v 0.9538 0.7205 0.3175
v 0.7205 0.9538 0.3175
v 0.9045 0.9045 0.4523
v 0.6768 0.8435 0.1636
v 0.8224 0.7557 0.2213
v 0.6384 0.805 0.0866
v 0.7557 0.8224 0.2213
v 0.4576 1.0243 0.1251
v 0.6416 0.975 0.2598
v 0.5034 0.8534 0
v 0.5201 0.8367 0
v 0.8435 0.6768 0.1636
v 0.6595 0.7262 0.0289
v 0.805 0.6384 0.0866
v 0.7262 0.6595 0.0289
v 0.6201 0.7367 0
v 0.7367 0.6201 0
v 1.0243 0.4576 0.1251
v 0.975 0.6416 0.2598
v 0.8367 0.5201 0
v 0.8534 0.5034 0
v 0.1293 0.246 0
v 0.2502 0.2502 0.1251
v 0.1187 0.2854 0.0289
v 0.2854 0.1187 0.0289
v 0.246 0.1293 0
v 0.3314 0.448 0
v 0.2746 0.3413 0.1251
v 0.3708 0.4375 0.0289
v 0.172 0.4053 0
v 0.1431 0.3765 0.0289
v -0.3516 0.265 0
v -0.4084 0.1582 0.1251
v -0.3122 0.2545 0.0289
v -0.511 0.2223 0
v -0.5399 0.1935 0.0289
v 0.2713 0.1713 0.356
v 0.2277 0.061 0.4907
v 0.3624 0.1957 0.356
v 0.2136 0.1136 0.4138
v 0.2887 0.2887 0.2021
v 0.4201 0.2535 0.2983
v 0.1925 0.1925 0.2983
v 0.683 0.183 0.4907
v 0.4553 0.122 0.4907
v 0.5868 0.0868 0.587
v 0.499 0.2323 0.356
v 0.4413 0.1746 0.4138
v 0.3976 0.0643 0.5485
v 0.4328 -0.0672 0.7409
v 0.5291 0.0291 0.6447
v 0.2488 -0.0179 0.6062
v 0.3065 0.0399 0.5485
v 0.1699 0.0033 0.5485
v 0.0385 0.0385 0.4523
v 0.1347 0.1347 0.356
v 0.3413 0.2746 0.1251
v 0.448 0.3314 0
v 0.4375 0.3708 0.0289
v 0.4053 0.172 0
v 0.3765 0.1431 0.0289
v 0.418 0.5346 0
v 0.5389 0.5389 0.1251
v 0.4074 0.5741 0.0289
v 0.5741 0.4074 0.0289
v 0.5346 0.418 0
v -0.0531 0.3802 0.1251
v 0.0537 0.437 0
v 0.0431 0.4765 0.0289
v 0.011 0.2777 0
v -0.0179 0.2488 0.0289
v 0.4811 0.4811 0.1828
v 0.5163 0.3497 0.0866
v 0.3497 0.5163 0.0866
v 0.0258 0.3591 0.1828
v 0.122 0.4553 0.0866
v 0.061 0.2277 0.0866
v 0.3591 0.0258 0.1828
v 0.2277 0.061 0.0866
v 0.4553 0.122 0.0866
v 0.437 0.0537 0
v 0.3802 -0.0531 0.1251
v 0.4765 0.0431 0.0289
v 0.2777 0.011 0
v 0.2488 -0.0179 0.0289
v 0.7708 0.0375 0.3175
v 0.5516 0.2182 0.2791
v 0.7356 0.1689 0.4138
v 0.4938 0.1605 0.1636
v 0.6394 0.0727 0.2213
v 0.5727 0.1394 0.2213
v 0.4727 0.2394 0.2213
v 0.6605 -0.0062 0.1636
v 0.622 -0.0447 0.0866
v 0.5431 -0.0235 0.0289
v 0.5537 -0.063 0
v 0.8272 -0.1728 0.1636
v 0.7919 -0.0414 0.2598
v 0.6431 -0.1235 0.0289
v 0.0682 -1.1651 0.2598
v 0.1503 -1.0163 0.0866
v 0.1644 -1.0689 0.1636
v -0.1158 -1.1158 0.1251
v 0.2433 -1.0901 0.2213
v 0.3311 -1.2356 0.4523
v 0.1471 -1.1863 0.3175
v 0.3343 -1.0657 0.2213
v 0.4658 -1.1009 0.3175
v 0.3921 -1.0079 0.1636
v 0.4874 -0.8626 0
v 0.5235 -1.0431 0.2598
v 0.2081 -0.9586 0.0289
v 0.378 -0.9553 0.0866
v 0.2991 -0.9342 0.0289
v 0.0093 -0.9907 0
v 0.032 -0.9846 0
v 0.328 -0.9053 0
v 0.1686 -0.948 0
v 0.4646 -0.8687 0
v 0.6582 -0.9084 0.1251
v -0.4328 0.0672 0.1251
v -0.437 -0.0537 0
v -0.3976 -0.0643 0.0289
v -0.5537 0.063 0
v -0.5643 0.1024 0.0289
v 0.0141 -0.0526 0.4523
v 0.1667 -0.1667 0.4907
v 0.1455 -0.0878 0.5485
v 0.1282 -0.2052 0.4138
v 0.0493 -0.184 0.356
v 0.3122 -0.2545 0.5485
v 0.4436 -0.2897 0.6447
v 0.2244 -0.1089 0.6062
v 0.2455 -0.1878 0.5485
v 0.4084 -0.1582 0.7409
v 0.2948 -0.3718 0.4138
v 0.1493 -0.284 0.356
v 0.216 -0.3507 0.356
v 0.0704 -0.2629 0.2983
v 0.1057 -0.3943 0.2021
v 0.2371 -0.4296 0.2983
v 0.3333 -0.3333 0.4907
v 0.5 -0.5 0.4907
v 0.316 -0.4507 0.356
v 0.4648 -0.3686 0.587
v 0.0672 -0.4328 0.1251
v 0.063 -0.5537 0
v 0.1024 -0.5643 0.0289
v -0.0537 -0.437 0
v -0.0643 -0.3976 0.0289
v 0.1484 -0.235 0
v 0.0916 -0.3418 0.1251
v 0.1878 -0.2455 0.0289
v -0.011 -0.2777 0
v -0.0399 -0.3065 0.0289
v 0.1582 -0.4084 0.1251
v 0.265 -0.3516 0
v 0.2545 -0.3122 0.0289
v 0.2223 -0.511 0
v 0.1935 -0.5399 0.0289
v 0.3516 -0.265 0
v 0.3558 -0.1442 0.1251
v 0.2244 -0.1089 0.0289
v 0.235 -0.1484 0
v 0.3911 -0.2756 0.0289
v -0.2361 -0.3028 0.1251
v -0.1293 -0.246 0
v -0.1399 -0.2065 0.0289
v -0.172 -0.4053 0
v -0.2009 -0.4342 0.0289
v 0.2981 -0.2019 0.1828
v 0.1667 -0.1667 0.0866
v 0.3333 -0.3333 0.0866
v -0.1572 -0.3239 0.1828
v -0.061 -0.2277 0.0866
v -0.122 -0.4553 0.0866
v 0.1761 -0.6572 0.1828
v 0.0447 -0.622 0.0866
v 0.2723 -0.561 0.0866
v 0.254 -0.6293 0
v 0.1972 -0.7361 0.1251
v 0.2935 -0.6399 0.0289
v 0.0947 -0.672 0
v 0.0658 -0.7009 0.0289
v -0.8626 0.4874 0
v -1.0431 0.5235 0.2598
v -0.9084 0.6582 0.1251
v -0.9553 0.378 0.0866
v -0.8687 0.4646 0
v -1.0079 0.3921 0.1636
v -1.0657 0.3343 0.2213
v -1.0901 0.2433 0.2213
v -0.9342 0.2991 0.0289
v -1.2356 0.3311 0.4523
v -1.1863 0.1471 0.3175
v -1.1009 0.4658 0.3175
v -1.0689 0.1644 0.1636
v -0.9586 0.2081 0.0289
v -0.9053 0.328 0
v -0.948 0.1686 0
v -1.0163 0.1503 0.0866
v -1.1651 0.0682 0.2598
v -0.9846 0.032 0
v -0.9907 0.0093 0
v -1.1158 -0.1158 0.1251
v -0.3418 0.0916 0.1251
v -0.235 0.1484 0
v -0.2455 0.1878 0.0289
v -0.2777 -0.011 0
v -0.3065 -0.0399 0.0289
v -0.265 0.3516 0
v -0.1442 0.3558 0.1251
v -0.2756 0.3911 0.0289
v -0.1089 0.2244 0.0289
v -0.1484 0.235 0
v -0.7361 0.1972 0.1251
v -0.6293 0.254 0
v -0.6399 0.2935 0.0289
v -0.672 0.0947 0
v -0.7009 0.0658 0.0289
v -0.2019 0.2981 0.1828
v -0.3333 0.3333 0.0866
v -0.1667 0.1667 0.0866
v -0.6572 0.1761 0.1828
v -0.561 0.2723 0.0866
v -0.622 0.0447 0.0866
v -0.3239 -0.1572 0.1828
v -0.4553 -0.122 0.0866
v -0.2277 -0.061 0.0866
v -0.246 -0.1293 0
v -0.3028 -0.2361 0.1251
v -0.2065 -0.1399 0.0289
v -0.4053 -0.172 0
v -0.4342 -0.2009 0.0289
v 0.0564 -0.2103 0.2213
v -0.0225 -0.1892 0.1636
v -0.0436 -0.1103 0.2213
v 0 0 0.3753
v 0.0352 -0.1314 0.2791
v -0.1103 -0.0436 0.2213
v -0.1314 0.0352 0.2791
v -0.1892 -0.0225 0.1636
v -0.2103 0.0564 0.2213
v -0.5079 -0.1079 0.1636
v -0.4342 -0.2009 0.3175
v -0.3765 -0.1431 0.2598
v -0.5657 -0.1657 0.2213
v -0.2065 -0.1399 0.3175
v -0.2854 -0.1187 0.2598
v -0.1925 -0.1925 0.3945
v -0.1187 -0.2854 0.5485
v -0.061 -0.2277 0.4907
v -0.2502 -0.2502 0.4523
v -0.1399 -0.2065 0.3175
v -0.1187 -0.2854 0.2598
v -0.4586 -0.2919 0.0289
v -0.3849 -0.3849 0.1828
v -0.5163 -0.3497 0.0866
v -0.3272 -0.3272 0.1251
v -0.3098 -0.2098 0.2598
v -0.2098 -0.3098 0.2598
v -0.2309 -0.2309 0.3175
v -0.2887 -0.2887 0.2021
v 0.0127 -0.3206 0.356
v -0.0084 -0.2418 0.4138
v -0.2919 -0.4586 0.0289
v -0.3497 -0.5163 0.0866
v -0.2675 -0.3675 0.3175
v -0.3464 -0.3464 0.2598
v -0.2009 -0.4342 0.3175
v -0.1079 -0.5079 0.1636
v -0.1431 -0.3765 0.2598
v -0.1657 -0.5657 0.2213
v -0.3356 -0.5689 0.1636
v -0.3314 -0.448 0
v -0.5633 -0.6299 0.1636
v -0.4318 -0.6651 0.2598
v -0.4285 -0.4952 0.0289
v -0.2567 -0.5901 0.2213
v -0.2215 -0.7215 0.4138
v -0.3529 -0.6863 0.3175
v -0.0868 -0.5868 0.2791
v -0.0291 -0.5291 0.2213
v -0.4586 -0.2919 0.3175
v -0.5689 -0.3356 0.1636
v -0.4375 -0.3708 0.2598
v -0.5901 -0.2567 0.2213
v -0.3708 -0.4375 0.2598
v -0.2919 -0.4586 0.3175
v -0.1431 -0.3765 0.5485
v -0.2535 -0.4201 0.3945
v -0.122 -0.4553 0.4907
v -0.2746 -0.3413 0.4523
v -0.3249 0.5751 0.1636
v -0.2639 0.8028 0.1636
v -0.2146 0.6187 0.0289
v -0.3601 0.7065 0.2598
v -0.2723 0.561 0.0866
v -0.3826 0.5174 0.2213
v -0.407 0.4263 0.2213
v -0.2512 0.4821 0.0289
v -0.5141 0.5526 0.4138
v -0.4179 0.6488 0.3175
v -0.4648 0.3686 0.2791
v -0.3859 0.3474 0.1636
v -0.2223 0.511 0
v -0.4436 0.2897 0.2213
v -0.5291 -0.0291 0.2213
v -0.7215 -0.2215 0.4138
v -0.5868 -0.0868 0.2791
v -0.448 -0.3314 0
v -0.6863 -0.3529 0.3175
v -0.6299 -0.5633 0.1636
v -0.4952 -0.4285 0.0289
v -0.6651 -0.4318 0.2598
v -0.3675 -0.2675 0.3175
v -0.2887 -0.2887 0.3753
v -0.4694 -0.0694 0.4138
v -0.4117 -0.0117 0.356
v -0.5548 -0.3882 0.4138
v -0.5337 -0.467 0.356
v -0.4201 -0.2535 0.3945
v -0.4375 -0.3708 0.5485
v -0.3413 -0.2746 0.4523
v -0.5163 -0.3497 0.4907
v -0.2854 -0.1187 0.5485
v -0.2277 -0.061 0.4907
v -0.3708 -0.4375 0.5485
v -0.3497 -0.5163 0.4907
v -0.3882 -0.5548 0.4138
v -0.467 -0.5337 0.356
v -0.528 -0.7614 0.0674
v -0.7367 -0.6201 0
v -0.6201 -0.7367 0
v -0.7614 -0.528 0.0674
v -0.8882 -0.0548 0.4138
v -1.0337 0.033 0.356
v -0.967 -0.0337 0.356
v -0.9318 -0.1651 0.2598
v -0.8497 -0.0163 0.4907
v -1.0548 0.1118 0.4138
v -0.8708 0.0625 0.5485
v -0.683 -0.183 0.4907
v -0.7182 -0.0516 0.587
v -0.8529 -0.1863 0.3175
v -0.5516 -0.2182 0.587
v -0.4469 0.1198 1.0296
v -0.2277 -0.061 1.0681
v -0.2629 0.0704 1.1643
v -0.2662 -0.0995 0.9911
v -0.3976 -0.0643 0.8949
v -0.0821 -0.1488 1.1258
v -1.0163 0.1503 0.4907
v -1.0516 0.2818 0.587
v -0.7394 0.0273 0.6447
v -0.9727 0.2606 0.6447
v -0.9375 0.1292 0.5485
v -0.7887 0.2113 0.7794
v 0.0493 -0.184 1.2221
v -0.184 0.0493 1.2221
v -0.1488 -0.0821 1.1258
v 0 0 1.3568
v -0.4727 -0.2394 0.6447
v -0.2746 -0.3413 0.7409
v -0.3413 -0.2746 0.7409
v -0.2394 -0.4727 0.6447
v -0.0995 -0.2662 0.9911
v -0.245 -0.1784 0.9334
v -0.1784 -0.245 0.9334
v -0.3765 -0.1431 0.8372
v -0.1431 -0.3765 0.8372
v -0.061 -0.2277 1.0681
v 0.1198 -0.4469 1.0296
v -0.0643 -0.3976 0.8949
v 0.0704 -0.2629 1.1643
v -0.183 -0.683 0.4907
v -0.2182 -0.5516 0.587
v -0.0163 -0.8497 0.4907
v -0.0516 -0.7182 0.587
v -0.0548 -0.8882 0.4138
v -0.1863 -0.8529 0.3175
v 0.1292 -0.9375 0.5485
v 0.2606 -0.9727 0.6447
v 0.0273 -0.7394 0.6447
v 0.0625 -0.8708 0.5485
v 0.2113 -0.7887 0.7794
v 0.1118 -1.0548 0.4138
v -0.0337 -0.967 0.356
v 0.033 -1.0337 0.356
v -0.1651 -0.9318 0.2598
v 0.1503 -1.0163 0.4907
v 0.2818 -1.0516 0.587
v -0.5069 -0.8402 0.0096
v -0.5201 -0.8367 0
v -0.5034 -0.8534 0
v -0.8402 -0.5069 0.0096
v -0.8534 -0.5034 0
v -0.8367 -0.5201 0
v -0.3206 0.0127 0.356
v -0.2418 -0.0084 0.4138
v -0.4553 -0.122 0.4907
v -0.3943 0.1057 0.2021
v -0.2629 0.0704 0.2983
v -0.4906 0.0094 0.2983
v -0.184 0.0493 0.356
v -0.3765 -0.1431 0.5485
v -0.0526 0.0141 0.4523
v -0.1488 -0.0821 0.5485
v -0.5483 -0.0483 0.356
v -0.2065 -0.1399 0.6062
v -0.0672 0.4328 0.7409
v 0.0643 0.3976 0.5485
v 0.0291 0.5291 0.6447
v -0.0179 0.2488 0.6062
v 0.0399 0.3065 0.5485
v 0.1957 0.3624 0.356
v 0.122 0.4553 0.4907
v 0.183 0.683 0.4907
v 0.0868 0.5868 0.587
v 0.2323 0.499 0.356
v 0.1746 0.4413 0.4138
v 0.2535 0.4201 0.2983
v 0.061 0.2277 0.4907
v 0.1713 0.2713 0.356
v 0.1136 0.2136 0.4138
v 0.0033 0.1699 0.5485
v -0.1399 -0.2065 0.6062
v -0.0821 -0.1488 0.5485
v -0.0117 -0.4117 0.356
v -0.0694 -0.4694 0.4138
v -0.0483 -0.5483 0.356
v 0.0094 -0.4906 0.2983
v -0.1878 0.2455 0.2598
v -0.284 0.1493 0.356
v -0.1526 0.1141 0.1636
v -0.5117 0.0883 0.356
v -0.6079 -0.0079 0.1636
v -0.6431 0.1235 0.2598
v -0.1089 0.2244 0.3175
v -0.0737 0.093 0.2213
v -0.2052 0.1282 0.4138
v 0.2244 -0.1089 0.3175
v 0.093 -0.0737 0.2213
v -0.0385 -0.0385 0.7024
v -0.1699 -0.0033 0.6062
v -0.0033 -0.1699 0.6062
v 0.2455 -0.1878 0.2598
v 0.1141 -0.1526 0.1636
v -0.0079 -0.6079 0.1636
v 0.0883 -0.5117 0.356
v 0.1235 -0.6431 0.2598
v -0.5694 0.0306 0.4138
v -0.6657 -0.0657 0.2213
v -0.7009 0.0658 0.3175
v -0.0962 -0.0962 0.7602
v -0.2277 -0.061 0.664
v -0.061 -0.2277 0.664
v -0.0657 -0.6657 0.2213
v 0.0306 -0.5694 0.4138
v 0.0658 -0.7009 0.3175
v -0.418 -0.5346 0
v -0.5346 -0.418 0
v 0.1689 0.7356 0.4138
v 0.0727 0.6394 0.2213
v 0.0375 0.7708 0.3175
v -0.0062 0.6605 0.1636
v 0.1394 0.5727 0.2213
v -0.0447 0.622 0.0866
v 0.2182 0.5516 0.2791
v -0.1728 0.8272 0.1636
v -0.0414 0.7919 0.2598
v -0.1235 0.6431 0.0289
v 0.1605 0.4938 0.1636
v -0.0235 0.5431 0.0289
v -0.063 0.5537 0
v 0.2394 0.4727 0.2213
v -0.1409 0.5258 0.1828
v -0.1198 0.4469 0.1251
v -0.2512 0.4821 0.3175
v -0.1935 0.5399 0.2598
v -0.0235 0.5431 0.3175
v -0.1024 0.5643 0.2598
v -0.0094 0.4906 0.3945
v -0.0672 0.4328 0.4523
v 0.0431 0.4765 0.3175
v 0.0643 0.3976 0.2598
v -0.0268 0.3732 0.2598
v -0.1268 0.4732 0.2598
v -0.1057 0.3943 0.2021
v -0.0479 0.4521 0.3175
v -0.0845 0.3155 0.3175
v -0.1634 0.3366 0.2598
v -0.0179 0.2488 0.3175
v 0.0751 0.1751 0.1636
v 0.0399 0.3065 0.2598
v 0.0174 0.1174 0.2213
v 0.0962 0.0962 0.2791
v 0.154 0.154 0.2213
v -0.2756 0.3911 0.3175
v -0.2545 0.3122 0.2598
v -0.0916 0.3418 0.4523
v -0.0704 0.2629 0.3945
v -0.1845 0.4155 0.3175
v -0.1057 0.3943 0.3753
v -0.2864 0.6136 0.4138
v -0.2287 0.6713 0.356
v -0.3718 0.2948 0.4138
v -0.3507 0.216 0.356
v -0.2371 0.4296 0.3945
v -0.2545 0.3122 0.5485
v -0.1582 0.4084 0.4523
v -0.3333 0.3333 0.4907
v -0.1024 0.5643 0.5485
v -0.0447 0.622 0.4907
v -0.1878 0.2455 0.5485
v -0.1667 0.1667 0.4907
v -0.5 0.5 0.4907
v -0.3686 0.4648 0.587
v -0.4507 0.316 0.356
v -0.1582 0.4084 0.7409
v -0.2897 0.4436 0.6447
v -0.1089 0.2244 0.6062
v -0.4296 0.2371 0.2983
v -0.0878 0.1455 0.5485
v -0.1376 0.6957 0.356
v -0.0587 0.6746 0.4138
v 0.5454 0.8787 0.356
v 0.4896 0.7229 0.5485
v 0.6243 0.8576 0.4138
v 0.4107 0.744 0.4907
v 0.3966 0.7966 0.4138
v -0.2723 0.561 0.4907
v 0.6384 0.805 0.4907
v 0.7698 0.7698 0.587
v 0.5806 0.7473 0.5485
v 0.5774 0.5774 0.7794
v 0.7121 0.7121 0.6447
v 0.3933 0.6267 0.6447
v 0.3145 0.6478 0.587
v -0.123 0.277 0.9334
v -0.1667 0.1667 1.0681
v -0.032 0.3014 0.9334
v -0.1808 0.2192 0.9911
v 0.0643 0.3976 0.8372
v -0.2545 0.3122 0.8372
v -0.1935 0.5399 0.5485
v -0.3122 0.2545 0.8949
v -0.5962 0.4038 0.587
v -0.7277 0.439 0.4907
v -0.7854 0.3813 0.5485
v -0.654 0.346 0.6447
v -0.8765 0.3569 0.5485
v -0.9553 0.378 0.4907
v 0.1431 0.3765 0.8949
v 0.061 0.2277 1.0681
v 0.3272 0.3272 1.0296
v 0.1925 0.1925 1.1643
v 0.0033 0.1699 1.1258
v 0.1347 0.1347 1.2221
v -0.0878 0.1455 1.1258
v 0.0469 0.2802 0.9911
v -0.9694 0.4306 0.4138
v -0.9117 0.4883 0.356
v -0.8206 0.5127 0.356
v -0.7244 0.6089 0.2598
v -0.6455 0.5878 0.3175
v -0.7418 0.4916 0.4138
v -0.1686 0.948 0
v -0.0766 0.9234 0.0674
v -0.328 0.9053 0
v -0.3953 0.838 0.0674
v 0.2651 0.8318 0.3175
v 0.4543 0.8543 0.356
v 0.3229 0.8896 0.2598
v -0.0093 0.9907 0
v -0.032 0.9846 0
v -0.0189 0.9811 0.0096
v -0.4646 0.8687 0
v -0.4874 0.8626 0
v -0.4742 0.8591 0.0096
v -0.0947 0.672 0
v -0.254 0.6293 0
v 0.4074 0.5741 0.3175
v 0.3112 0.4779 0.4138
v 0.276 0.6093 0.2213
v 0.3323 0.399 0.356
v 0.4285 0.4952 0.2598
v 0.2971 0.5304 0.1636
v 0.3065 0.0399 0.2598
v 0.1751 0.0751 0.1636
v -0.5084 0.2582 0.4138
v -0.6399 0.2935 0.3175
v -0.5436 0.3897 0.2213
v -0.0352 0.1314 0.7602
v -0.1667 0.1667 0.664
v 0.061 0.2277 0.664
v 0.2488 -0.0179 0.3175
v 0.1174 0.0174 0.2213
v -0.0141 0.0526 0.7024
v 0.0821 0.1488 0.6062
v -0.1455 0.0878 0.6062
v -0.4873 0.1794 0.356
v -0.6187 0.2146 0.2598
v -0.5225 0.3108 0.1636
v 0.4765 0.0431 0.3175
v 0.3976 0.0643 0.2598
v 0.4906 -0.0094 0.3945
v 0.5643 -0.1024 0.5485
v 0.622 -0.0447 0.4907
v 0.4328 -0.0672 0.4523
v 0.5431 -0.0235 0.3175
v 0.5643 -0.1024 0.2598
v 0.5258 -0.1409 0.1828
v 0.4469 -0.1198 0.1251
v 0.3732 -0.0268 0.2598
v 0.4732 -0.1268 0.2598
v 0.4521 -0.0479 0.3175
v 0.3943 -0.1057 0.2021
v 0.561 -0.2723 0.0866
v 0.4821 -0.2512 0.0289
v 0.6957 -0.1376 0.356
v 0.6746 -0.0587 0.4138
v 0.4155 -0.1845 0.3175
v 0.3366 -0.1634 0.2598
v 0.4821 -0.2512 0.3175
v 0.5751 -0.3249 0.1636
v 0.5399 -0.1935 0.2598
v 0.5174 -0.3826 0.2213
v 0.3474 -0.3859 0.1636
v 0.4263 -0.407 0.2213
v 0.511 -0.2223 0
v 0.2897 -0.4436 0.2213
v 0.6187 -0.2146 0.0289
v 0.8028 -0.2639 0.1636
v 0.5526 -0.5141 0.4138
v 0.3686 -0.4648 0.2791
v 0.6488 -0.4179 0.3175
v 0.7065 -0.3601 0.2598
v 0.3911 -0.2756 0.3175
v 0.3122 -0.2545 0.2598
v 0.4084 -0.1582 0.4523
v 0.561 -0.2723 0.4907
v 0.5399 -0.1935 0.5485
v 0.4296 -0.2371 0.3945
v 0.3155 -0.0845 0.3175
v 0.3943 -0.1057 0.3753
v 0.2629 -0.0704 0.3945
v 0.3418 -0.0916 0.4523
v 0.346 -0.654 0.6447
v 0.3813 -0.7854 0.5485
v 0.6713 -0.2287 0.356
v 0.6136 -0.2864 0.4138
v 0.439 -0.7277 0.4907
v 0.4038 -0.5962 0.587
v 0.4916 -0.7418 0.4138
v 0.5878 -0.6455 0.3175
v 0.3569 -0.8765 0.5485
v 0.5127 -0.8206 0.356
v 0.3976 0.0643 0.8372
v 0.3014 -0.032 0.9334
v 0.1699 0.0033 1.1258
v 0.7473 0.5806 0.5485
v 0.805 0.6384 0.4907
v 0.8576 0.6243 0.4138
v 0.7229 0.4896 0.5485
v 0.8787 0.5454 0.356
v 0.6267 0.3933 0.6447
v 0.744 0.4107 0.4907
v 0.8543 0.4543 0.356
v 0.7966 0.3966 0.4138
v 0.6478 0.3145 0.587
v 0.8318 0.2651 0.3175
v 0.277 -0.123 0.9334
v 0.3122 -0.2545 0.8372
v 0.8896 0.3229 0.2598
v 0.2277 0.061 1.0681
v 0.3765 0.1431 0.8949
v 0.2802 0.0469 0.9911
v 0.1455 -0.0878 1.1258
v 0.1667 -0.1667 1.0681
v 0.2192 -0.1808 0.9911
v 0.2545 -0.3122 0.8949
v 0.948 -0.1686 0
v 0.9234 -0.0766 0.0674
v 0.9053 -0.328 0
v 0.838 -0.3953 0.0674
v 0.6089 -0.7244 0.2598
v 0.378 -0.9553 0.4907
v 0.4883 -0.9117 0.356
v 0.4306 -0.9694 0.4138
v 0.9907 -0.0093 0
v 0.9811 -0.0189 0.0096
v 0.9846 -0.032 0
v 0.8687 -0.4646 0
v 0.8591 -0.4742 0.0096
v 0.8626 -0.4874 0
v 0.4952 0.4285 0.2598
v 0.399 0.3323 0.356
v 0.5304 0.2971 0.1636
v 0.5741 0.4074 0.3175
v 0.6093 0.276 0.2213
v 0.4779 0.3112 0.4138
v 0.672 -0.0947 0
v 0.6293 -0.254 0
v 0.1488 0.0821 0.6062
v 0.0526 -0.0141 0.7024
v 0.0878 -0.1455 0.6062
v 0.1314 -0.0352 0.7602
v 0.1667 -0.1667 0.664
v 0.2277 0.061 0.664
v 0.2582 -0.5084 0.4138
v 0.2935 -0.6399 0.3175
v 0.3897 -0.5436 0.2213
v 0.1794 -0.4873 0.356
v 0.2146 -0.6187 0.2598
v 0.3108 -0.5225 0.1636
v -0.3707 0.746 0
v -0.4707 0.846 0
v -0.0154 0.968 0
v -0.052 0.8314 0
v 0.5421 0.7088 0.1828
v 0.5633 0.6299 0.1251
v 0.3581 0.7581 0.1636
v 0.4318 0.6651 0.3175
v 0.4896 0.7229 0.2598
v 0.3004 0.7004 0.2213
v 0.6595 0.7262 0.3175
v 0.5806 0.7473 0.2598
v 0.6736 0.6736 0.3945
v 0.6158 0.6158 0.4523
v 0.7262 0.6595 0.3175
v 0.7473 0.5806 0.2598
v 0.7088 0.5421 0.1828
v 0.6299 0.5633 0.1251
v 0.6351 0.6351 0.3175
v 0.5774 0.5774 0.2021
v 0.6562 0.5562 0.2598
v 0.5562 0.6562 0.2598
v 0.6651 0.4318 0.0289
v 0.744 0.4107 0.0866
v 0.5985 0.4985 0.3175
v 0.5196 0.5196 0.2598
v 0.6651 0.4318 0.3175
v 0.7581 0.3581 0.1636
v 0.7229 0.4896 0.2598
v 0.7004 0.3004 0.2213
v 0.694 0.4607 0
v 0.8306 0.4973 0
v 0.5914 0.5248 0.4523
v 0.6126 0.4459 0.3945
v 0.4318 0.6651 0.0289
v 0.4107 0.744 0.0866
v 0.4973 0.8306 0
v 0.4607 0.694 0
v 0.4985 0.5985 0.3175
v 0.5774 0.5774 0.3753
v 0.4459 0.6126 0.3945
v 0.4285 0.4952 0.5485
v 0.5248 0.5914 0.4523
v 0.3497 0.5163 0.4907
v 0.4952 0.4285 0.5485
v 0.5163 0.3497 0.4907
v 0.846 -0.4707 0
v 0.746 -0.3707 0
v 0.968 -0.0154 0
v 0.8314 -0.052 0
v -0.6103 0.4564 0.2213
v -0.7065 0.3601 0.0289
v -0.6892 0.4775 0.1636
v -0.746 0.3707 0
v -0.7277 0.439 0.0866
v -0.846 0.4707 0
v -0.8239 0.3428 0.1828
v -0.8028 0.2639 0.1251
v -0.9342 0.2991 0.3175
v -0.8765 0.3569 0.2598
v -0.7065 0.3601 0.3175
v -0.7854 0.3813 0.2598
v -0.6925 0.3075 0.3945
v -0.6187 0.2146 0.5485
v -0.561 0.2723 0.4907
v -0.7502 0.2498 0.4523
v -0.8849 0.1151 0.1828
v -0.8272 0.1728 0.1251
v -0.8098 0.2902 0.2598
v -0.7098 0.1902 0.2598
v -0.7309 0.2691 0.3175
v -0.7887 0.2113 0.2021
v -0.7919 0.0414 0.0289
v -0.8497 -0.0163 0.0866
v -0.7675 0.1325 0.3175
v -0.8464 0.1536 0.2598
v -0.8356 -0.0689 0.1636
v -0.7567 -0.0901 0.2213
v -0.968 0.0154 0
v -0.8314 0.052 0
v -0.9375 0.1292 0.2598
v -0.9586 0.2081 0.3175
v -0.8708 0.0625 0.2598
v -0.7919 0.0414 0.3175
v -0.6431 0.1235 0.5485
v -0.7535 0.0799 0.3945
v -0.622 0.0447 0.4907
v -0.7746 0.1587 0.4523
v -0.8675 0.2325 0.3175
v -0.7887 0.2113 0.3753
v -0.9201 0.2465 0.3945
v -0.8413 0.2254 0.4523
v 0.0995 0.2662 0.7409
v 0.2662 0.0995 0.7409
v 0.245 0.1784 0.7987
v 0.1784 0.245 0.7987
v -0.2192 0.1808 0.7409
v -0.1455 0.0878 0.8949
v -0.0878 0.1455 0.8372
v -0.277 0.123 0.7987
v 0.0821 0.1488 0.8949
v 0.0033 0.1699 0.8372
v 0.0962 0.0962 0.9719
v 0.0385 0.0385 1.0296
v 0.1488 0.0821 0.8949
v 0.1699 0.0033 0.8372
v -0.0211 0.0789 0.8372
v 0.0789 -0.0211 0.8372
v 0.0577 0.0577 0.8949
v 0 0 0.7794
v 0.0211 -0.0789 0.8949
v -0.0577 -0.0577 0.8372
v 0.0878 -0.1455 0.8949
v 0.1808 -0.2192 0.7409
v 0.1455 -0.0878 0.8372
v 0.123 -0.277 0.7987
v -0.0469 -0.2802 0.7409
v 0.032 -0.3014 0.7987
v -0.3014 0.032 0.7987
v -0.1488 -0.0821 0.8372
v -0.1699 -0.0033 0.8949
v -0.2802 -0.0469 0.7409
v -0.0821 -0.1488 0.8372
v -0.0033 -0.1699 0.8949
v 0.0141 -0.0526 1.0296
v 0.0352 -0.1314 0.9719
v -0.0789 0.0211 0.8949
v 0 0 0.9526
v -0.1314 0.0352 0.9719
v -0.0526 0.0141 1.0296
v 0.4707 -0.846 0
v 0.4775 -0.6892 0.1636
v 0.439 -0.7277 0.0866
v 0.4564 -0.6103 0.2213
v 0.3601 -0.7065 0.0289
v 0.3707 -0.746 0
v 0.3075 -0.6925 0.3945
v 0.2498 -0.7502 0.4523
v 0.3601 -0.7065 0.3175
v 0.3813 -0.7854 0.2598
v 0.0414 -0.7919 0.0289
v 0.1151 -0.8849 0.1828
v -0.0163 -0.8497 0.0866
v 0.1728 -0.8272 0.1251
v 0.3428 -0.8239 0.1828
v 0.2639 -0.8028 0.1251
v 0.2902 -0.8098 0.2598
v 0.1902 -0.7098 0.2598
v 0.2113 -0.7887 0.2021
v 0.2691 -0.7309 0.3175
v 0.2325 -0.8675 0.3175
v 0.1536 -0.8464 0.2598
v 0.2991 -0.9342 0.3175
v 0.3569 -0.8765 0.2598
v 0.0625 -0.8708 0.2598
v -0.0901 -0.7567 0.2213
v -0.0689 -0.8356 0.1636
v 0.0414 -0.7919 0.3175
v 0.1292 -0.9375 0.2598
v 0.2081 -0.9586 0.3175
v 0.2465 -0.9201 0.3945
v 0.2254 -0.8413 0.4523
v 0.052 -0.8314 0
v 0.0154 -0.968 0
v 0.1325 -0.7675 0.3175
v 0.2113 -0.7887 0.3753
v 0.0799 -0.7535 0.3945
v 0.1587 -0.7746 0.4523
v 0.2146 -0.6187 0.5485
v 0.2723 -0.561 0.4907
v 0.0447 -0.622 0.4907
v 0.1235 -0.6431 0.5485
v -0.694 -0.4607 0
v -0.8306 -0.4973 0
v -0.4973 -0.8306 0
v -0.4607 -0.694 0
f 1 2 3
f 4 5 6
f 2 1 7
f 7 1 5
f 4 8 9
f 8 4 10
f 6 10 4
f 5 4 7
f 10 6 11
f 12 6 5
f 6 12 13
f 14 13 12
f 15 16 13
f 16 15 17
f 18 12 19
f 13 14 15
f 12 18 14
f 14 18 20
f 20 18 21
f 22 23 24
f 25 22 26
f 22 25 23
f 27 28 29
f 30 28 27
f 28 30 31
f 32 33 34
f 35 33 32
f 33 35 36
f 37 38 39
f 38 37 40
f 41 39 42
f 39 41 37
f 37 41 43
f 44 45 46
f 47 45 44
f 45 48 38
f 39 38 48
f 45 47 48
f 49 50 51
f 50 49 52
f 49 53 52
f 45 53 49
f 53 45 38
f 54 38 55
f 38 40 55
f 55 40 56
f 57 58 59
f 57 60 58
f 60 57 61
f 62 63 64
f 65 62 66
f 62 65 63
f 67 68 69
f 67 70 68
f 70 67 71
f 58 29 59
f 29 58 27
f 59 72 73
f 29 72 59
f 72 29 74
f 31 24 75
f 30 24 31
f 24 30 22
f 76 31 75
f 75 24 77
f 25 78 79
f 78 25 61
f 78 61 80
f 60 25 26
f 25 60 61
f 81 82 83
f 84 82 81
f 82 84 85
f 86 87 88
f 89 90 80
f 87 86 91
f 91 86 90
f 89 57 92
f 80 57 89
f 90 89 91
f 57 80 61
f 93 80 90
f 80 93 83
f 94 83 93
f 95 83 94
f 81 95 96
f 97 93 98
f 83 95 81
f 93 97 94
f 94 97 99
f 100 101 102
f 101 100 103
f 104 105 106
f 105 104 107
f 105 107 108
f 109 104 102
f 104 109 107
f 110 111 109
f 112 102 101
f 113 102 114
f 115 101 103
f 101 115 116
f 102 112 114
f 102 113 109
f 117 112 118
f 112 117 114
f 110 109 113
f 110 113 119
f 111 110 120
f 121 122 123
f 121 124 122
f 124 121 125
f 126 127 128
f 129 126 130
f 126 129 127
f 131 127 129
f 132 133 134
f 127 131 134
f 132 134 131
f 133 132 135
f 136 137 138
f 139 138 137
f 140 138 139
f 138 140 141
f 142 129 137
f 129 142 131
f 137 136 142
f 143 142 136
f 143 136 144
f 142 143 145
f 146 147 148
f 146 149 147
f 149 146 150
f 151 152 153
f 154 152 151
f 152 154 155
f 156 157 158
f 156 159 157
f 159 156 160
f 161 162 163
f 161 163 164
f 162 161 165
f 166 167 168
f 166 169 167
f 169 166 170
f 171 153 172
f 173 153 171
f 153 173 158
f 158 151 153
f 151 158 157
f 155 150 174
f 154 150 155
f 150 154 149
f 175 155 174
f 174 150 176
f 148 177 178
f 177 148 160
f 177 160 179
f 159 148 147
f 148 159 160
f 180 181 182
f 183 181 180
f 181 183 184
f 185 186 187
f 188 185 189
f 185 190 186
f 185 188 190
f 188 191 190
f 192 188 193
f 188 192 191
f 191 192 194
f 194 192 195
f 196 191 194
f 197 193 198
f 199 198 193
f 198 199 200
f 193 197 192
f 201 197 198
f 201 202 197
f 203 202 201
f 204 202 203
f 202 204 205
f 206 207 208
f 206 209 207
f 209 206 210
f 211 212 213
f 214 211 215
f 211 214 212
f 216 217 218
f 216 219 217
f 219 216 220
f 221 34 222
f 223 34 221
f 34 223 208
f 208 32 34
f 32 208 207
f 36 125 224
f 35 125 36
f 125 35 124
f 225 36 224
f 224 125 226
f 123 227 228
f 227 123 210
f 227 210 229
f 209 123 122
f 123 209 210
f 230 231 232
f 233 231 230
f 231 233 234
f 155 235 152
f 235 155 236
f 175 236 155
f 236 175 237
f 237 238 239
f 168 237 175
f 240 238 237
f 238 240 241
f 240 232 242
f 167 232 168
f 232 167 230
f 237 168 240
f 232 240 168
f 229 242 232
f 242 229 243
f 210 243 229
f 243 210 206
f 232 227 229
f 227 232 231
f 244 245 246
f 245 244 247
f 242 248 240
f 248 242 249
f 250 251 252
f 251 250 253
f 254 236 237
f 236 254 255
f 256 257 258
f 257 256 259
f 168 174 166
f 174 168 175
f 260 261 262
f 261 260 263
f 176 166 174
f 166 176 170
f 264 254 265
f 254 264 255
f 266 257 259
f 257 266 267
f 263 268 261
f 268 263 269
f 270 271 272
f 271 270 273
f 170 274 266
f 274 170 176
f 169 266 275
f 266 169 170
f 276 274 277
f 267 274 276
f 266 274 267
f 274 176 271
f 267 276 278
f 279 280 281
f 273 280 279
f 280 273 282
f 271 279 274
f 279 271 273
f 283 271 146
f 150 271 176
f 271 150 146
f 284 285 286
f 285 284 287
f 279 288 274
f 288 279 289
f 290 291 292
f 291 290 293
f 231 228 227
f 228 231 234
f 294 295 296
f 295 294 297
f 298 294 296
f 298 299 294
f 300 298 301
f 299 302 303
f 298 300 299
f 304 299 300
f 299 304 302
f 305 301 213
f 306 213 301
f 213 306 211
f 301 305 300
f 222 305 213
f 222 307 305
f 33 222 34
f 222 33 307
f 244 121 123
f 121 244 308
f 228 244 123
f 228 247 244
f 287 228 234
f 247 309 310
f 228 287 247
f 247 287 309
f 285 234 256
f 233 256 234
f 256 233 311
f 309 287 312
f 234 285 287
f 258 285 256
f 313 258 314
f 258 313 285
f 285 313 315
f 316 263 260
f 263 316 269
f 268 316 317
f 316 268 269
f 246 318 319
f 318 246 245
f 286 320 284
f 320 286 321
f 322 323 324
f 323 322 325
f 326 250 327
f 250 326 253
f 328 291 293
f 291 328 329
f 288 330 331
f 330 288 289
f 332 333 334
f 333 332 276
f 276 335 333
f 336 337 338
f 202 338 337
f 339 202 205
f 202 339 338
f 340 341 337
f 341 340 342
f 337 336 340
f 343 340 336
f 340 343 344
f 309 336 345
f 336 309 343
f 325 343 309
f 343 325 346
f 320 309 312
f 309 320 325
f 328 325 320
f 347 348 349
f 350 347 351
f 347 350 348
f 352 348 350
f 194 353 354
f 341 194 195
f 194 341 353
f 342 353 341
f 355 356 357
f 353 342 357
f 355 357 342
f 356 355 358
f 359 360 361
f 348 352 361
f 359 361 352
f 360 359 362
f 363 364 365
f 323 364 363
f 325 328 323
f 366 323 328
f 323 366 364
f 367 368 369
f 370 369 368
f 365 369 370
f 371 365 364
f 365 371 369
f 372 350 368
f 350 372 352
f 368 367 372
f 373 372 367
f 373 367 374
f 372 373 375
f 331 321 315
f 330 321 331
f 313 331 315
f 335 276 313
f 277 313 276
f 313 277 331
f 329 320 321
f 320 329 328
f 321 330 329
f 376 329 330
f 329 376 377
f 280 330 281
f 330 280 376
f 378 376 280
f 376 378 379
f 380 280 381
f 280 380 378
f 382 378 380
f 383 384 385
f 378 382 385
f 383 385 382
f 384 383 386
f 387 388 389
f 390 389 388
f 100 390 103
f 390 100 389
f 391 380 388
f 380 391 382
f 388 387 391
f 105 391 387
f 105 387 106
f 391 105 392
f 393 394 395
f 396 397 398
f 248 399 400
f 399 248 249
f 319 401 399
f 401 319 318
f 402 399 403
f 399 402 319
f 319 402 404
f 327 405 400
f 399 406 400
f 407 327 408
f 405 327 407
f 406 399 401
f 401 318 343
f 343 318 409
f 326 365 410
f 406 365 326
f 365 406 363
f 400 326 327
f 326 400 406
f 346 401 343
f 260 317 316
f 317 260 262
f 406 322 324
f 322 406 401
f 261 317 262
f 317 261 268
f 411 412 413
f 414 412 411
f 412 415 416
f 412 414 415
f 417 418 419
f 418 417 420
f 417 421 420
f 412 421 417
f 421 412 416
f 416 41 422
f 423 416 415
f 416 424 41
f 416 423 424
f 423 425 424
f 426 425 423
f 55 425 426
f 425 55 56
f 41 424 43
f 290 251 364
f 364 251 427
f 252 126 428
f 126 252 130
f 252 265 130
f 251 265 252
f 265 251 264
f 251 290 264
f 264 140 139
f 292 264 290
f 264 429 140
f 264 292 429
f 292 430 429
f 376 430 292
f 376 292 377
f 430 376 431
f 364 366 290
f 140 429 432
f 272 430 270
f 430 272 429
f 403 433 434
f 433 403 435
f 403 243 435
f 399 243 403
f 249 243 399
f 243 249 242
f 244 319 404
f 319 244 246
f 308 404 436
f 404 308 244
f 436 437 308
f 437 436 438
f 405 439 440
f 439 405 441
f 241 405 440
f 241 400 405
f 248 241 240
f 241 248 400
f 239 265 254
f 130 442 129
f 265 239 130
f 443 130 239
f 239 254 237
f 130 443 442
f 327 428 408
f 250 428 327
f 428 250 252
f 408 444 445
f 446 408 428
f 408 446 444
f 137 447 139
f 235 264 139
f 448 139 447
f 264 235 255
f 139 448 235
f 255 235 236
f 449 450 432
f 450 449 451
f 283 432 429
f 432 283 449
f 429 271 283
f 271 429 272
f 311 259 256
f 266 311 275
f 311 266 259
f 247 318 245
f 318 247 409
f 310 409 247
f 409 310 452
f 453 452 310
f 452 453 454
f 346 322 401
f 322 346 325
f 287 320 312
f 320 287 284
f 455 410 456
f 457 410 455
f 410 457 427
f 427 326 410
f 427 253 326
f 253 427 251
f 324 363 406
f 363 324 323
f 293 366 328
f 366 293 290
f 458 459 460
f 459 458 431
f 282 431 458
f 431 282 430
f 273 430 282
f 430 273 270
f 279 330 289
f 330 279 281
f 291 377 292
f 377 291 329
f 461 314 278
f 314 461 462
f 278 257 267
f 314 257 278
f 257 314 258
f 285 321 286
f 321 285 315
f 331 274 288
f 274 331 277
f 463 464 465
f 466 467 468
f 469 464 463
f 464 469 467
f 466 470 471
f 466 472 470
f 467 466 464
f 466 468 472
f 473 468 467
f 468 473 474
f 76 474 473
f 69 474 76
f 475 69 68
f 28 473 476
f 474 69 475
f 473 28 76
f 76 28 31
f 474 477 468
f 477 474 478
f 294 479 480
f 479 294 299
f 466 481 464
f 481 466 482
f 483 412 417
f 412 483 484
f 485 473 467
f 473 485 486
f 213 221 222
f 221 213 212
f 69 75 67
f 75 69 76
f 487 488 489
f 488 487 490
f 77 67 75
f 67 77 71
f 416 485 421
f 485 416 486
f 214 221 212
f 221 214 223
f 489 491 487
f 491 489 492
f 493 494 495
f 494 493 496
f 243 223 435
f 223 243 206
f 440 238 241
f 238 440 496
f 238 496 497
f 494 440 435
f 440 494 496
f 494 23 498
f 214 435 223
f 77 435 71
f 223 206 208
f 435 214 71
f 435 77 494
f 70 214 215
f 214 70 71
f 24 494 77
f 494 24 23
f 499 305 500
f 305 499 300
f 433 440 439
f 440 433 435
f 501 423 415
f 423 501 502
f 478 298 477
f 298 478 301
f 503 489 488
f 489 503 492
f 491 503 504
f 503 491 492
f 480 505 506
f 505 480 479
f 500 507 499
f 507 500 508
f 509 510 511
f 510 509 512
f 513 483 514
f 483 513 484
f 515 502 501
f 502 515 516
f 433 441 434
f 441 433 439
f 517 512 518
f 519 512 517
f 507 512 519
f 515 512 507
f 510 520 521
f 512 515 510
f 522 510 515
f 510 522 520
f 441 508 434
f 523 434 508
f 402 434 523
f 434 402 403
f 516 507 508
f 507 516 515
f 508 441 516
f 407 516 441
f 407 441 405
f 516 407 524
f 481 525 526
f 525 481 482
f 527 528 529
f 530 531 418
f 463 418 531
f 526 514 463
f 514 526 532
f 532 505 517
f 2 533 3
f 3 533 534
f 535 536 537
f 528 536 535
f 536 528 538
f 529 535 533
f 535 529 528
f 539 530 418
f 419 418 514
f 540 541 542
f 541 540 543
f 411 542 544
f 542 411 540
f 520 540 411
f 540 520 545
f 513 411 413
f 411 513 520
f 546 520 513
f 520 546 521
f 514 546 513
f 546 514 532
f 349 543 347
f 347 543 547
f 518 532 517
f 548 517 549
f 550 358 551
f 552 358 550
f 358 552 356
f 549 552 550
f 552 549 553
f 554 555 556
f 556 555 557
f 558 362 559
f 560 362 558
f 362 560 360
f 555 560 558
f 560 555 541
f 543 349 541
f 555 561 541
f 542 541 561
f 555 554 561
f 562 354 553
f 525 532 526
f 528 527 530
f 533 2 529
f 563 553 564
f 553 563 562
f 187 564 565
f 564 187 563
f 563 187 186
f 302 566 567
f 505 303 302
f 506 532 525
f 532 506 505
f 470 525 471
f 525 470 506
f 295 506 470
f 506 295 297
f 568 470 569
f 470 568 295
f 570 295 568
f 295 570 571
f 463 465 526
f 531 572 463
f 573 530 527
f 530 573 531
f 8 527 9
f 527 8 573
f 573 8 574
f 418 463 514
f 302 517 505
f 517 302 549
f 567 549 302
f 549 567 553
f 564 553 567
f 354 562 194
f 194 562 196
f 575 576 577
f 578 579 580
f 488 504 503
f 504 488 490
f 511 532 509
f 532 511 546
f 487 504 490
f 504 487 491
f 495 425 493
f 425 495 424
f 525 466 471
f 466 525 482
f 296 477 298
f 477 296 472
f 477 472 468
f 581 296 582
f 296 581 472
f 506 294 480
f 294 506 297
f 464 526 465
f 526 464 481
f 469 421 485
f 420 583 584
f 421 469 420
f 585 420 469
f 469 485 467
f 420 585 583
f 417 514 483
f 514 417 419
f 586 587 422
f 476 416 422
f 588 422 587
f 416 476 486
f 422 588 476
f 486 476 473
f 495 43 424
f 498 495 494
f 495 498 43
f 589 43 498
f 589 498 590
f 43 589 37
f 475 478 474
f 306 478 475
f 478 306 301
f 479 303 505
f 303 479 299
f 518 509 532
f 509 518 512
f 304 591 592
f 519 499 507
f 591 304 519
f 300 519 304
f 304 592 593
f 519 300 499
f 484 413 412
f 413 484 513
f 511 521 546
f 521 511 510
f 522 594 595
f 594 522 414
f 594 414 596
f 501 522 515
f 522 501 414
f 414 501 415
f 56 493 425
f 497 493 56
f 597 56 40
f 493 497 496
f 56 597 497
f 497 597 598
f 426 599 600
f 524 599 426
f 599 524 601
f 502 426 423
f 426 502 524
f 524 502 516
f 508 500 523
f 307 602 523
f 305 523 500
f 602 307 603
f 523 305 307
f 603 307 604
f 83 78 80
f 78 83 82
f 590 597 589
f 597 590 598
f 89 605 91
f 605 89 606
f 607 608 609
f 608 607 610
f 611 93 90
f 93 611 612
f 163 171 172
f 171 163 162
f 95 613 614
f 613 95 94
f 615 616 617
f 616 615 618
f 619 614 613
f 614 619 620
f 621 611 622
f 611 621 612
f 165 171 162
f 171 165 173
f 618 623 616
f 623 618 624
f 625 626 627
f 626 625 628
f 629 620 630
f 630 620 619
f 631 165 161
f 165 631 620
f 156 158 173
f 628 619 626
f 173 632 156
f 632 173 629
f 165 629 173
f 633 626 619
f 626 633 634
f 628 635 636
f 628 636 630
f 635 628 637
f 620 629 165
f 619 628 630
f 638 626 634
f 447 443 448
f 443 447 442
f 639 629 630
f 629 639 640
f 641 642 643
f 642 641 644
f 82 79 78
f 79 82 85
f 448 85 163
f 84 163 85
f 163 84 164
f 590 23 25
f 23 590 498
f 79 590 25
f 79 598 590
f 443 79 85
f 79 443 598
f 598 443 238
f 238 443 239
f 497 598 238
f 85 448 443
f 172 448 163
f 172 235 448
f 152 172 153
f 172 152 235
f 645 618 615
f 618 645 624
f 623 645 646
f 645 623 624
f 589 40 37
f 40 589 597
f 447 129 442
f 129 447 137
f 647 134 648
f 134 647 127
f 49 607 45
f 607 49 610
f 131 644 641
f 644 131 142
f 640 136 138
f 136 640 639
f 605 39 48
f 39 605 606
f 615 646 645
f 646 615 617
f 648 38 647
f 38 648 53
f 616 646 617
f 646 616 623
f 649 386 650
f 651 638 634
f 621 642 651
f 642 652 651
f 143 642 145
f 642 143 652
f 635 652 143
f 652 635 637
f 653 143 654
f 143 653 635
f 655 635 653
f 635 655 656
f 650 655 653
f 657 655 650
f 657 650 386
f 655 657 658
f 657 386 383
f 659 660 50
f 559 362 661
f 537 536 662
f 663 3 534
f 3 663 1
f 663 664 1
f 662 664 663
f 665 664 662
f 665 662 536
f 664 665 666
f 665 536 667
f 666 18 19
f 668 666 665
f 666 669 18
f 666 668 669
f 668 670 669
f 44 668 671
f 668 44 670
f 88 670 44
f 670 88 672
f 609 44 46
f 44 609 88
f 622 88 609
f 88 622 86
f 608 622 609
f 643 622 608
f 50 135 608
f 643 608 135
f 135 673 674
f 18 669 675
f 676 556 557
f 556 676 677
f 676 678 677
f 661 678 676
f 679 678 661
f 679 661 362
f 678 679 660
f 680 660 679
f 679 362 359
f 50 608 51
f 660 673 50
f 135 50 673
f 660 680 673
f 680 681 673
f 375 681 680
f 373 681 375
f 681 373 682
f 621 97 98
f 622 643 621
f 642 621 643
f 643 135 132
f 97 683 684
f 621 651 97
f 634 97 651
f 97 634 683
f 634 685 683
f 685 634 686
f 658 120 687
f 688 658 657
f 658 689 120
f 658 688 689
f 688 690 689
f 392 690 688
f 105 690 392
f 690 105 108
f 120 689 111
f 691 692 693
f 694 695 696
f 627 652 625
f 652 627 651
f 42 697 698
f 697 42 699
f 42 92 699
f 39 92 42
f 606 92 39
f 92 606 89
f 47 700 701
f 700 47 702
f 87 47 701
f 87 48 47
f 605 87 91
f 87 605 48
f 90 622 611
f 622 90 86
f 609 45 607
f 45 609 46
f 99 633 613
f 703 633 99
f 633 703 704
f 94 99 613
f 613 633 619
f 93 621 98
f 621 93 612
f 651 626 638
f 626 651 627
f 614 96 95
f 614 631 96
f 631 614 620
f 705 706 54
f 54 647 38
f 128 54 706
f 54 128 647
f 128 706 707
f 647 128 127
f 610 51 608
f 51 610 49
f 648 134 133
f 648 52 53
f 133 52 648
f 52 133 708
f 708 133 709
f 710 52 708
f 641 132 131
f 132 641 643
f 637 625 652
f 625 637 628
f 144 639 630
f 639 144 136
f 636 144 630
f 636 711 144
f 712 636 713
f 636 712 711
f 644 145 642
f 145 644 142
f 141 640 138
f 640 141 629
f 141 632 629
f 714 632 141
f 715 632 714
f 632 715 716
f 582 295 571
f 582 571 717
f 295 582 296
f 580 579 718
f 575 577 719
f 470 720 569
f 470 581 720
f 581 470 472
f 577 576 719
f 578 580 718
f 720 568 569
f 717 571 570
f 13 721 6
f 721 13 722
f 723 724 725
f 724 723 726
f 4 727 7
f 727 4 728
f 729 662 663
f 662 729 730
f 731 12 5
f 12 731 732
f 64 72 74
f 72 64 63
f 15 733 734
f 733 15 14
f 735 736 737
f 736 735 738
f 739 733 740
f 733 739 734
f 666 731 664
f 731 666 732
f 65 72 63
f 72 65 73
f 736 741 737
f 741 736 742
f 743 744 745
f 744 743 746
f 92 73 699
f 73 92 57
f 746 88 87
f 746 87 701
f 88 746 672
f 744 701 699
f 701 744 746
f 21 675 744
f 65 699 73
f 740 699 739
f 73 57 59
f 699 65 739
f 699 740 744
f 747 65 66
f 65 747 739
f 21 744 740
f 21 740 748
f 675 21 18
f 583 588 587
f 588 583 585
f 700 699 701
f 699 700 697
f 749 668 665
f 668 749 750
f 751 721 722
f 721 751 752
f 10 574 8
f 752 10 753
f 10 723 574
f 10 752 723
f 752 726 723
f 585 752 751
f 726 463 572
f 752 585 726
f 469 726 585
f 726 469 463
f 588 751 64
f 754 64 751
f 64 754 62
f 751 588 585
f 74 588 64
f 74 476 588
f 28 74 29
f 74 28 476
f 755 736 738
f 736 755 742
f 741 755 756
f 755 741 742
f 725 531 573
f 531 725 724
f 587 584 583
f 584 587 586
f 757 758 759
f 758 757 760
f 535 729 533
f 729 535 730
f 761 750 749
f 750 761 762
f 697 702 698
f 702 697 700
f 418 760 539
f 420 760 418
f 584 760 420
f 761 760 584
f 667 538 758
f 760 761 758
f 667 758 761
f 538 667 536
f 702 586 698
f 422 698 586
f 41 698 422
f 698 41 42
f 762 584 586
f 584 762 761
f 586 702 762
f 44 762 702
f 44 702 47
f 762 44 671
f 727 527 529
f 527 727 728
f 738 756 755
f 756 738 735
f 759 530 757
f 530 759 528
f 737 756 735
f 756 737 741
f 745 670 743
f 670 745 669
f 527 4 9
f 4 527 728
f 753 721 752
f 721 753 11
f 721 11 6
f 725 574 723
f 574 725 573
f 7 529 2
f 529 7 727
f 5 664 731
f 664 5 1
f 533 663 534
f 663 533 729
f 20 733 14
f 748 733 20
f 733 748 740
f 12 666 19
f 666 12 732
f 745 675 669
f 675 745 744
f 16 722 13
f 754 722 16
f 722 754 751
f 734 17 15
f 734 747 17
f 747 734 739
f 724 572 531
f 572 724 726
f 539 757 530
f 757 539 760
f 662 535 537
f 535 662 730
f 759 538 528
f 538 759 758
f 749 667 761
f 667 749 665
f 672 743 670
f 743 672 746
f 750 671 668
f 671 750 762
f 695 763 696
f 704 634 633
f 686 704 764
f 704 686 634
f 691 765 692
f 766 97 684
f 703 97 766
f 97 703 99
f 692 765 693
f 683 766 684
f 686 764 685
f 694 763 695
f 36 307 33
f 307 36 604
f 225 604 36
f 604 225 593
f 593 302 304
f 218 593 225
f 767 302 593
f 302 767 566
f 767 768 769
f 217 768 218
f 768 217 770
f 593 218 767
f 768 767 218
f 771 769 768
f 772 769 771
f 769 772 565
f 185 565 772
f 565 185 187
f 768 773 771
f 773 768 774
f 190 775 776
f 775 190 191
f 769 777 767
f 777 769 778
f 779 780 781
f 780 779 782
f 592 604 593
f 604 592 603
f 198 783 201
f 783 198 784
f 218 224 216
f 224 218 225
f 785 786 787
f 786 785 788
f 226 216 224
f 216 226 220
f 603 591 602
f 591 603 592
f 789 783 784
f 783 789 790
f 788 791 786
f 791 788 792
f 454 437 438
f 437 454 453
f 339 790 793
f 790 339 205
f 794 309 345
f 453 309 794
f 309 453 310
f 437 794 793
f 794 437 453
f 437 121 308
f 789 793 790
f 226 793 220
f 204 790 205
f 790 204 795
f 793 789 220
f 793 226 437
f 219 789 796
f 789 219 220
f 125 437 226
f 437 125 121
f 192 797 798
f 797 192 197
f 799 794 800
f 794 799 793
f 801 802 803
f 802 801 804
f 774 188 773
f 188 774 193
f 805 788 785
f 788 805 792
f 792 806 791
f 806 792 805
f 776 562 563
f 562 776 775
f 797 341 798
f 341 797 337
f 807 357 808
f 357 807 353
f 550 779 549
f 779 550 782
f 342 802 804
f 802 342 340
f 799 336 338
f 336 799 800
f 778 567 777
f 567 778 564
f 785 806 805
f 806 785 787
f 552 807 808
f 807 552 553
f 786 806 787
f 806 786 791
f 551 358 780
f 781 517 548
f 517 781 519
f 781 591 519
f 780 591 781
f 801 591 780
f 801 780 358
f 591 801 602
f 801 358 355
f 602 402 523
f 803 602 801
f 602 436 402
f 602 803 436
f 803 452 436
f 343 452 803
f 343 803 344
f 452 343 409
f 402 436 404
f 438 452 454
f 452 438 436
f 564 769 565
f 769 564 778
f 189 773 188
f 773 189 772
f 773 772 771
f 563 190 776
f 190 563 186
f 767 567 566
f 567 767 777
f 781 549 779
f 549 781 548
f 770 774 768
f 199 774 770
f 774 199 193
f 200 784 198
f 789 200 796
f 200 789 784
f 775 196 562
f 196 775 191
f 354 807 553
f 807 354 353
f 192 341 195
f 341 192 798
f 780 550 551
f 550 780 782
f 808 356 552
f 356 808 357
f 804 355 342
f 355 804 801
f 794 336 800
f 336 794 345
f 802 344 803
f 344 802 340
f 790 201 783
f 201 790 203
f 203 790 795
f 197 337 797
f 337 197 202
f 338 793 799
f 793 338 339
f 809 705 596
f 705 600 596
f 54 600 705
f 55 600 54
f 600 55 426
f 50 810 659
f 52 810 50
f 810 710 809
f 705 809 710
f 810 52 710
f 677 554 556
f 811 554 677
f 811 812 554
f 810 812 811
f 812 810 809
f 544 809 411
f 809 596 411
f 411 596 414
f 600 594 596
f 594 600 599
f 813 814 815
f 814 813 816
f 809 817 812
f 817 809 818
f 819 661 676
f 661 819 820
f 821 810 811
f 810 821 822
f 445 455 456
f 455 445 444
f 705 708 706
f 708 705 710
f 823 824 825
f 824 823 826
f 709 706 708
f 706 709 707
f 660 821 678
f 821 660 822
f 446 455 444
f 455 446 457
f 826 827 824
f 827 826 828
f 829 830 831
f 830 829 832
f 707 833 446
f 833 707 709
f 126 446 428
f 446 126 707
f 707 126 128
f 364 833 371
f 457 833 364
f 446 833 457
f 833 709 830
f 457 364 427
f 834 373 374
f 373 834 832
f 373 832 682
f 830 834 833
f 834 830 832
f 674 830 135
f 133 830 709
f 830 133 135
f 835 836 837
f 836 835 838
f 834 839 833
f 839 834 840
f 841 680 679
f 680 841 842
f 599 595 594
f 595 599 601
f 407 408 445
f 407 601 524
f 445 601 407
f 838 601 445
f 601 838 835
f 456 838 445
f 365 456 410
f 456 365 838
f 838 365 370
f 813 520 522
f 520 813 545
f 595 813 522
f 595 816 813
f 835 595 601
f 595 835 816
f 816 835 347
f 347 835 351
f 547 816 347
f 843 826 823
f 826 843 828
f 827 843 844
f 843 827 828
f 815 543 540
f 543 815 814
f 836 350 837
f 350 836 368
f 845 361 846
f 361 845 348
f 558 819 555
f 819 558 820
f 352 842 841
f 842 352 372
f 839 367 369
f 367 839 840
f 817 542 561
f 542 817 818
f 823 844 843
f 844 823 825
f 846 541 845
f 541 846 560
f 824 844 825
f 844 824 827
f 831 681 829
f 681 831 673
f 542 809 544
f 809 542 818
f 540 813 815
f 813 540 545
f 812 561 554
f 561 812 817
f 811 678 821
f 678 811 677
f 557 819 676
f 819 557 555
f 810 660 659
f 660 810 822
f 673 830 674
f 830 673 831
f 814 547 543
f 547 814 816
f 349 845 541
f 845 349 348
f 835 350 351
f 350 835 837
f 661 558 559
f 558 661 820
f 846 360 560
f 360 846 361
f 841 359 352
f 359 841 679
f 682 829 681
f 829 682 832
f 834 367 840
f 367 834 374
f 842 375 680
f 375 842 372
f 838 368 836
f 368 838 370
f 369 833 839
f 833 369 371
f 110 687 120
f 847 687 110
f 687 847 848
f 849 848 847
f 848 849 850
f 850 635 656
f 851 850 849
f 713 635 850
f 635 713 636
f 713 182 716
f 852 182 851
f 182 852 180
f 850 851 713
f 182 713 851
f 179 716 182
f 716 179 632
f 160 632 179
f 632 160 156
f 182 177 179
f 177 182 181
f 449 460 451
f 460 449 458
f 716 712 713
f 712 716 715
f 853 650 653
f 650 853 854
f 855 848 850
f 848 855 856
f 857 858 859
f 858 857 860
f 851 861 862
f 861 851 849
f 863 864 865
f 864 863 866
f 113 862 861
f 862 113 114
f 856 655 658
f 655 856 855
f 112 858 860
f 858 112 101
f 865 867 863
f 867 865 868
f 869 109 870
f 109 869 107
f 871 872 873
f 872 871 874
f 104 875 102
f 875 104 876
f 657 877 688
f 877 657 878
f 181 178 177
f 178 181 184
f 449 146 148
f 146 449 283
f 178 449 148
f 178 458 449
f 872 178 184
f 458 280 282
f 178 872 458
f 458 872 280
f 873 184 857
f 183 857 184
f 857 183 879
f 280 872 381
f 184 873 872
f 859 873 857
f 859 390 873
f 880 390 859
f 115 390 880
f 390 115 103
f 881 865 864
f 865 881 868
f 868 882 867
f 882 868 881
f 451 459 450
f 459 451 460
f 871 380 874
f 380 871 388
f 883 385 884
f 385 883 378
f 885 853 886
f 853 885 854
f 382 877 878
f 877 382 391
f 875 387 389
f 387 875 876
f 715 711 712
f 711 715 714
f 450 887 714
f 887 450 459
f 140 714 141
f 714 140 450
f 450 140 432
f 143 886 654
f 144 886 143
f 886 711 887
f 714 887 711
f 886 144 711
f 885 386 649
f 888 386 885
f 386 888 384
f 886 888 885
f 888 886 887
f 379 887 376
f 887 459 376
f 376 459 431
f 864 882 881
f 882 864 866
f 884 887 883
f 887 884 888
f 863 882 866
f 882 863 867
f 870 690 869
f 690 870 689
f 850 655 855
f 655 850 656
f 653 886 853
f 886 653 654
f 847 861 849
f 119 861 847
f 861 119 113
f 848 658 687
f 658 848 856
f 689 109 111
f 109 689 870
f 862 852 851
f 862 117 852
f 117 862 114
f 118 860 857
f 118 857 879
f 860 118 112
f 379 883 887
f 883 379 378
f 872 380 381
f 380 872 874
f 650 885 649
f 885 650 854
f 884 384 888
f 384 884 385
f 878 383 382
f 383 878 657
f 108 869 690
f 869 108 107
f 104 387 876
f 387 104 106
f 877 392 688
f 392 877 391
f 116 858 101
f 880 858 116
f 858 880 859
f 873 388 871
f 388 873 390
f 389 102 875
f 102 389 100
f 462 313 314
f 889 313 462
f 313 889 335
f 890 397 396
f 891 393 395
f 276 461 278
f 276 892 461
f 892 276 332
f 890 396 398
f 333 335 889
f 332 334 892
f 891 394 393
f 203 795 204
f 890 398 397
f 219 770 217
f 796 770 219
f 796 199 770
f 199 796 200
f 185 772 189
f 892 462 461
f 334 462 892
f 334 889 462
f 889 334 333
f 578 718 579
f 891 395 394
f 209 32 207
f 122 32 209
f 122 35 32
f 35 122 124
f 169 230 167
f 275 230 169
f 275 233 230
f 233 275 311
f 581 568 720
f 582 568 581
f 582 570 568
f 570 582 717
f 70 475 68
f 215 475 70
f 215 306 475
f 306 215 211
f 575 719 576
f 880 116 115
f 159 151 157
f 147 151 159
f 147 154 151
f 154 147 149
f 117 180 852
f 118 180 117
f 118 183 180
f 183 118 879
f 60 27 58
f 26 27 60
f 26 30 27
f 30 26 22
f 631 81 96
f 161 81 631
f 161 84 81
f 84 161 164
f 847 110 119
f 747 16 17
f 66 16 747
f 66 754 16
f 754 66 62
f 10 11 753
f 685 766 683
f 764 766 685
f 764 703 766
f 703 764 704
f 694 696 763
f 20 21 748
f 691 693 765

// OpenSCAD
// Number of iterations
iterations = 3;
// Half
half = true;

module sierpinski_cube(n, cell_points, cell_faces) {
    if (n == 0) {
        scale(1.1)
        cube(size=[1,1,1], center=true);
    } else {
        union() {
            translate(pow(3, n - 1) * [0,0,-0.5])
            sierpinski_cube(n - 1, cell_points, cell_faces);
            translate(pow(3, n - 1) * [0,-0.5,0])
            sierpinski_cube(n - 1, cell_points, cell_faces);
            translate(pow(3, n - 1) * [-0.5,0,0])
            sierpinski_cube(n - 1, cell_points, cell_faces);
            translate(pow(3, n - 1) * [0,0,0.5])
            sierpinski_cube(n - 1, cell_points, cell_faces);
            translate(pow(3, n - 1) * [0,0.5,0])
            sierpinski_cube(n - 1, cell_points, cell_faces);
            translate(pow(3, n - 1) * [0.5,0,0])
            sierpinski_cube(n - 1, cell_points, cell_faces);
            for (pt = cell_points) {
                translate(pow(3, n - 1) * pt)
                sierpinski_cube(n - 1, cell_points, cell_faces);
            }
        }
    }
}

FACES = [
    [0, 1, 2, 3],
    [4, 7, 6, 5],
    [0, 4, 5, 1],
    [1, 5, 6, 2],
    [2, 6, 7, 3],
    [3, 7, 4, 0]
];
POINTS = [
    [-0.5, 0.5, -0.5],
    [0.5, 0.5, -0.5],
    [0.5, -0.5, -0.5],
    [-0.5, -0.5, -0.5],
    [-0.5, 0.5, 0.5],
    [0.5, 0.5, 0.5],
    [0.5, -0.5, 0.5],
    [-0.5, -0.5, 0.5]
];

if(half) {
    difference() {
        scale(pow(1.0/3,iterations-1))
        rotate(acos(([1,1,1]*[0,0,1])/norm([1,1,1])),cross([1,1,1],[0,0,1]))
        sierpinski_cube(iterations, POINTS, FACES);
        
        scale(5) translate([-0.5,-0.5,0]) polyhedron( points=[
            [0, 1, 0],
            [1, 1, 0],
            [1, 0, 0],
            [0, 0, 0],
            [0, 1, -1],
            [1, 1, -1],
            [1, 0, -1],
            [0, 0, -1]
        ], faces=FACES);
        
    }
} else {
    scale(pow(1.0/3,iterations-1))
    sierpinski_cube(iterations, POINTS, FACES);
}
